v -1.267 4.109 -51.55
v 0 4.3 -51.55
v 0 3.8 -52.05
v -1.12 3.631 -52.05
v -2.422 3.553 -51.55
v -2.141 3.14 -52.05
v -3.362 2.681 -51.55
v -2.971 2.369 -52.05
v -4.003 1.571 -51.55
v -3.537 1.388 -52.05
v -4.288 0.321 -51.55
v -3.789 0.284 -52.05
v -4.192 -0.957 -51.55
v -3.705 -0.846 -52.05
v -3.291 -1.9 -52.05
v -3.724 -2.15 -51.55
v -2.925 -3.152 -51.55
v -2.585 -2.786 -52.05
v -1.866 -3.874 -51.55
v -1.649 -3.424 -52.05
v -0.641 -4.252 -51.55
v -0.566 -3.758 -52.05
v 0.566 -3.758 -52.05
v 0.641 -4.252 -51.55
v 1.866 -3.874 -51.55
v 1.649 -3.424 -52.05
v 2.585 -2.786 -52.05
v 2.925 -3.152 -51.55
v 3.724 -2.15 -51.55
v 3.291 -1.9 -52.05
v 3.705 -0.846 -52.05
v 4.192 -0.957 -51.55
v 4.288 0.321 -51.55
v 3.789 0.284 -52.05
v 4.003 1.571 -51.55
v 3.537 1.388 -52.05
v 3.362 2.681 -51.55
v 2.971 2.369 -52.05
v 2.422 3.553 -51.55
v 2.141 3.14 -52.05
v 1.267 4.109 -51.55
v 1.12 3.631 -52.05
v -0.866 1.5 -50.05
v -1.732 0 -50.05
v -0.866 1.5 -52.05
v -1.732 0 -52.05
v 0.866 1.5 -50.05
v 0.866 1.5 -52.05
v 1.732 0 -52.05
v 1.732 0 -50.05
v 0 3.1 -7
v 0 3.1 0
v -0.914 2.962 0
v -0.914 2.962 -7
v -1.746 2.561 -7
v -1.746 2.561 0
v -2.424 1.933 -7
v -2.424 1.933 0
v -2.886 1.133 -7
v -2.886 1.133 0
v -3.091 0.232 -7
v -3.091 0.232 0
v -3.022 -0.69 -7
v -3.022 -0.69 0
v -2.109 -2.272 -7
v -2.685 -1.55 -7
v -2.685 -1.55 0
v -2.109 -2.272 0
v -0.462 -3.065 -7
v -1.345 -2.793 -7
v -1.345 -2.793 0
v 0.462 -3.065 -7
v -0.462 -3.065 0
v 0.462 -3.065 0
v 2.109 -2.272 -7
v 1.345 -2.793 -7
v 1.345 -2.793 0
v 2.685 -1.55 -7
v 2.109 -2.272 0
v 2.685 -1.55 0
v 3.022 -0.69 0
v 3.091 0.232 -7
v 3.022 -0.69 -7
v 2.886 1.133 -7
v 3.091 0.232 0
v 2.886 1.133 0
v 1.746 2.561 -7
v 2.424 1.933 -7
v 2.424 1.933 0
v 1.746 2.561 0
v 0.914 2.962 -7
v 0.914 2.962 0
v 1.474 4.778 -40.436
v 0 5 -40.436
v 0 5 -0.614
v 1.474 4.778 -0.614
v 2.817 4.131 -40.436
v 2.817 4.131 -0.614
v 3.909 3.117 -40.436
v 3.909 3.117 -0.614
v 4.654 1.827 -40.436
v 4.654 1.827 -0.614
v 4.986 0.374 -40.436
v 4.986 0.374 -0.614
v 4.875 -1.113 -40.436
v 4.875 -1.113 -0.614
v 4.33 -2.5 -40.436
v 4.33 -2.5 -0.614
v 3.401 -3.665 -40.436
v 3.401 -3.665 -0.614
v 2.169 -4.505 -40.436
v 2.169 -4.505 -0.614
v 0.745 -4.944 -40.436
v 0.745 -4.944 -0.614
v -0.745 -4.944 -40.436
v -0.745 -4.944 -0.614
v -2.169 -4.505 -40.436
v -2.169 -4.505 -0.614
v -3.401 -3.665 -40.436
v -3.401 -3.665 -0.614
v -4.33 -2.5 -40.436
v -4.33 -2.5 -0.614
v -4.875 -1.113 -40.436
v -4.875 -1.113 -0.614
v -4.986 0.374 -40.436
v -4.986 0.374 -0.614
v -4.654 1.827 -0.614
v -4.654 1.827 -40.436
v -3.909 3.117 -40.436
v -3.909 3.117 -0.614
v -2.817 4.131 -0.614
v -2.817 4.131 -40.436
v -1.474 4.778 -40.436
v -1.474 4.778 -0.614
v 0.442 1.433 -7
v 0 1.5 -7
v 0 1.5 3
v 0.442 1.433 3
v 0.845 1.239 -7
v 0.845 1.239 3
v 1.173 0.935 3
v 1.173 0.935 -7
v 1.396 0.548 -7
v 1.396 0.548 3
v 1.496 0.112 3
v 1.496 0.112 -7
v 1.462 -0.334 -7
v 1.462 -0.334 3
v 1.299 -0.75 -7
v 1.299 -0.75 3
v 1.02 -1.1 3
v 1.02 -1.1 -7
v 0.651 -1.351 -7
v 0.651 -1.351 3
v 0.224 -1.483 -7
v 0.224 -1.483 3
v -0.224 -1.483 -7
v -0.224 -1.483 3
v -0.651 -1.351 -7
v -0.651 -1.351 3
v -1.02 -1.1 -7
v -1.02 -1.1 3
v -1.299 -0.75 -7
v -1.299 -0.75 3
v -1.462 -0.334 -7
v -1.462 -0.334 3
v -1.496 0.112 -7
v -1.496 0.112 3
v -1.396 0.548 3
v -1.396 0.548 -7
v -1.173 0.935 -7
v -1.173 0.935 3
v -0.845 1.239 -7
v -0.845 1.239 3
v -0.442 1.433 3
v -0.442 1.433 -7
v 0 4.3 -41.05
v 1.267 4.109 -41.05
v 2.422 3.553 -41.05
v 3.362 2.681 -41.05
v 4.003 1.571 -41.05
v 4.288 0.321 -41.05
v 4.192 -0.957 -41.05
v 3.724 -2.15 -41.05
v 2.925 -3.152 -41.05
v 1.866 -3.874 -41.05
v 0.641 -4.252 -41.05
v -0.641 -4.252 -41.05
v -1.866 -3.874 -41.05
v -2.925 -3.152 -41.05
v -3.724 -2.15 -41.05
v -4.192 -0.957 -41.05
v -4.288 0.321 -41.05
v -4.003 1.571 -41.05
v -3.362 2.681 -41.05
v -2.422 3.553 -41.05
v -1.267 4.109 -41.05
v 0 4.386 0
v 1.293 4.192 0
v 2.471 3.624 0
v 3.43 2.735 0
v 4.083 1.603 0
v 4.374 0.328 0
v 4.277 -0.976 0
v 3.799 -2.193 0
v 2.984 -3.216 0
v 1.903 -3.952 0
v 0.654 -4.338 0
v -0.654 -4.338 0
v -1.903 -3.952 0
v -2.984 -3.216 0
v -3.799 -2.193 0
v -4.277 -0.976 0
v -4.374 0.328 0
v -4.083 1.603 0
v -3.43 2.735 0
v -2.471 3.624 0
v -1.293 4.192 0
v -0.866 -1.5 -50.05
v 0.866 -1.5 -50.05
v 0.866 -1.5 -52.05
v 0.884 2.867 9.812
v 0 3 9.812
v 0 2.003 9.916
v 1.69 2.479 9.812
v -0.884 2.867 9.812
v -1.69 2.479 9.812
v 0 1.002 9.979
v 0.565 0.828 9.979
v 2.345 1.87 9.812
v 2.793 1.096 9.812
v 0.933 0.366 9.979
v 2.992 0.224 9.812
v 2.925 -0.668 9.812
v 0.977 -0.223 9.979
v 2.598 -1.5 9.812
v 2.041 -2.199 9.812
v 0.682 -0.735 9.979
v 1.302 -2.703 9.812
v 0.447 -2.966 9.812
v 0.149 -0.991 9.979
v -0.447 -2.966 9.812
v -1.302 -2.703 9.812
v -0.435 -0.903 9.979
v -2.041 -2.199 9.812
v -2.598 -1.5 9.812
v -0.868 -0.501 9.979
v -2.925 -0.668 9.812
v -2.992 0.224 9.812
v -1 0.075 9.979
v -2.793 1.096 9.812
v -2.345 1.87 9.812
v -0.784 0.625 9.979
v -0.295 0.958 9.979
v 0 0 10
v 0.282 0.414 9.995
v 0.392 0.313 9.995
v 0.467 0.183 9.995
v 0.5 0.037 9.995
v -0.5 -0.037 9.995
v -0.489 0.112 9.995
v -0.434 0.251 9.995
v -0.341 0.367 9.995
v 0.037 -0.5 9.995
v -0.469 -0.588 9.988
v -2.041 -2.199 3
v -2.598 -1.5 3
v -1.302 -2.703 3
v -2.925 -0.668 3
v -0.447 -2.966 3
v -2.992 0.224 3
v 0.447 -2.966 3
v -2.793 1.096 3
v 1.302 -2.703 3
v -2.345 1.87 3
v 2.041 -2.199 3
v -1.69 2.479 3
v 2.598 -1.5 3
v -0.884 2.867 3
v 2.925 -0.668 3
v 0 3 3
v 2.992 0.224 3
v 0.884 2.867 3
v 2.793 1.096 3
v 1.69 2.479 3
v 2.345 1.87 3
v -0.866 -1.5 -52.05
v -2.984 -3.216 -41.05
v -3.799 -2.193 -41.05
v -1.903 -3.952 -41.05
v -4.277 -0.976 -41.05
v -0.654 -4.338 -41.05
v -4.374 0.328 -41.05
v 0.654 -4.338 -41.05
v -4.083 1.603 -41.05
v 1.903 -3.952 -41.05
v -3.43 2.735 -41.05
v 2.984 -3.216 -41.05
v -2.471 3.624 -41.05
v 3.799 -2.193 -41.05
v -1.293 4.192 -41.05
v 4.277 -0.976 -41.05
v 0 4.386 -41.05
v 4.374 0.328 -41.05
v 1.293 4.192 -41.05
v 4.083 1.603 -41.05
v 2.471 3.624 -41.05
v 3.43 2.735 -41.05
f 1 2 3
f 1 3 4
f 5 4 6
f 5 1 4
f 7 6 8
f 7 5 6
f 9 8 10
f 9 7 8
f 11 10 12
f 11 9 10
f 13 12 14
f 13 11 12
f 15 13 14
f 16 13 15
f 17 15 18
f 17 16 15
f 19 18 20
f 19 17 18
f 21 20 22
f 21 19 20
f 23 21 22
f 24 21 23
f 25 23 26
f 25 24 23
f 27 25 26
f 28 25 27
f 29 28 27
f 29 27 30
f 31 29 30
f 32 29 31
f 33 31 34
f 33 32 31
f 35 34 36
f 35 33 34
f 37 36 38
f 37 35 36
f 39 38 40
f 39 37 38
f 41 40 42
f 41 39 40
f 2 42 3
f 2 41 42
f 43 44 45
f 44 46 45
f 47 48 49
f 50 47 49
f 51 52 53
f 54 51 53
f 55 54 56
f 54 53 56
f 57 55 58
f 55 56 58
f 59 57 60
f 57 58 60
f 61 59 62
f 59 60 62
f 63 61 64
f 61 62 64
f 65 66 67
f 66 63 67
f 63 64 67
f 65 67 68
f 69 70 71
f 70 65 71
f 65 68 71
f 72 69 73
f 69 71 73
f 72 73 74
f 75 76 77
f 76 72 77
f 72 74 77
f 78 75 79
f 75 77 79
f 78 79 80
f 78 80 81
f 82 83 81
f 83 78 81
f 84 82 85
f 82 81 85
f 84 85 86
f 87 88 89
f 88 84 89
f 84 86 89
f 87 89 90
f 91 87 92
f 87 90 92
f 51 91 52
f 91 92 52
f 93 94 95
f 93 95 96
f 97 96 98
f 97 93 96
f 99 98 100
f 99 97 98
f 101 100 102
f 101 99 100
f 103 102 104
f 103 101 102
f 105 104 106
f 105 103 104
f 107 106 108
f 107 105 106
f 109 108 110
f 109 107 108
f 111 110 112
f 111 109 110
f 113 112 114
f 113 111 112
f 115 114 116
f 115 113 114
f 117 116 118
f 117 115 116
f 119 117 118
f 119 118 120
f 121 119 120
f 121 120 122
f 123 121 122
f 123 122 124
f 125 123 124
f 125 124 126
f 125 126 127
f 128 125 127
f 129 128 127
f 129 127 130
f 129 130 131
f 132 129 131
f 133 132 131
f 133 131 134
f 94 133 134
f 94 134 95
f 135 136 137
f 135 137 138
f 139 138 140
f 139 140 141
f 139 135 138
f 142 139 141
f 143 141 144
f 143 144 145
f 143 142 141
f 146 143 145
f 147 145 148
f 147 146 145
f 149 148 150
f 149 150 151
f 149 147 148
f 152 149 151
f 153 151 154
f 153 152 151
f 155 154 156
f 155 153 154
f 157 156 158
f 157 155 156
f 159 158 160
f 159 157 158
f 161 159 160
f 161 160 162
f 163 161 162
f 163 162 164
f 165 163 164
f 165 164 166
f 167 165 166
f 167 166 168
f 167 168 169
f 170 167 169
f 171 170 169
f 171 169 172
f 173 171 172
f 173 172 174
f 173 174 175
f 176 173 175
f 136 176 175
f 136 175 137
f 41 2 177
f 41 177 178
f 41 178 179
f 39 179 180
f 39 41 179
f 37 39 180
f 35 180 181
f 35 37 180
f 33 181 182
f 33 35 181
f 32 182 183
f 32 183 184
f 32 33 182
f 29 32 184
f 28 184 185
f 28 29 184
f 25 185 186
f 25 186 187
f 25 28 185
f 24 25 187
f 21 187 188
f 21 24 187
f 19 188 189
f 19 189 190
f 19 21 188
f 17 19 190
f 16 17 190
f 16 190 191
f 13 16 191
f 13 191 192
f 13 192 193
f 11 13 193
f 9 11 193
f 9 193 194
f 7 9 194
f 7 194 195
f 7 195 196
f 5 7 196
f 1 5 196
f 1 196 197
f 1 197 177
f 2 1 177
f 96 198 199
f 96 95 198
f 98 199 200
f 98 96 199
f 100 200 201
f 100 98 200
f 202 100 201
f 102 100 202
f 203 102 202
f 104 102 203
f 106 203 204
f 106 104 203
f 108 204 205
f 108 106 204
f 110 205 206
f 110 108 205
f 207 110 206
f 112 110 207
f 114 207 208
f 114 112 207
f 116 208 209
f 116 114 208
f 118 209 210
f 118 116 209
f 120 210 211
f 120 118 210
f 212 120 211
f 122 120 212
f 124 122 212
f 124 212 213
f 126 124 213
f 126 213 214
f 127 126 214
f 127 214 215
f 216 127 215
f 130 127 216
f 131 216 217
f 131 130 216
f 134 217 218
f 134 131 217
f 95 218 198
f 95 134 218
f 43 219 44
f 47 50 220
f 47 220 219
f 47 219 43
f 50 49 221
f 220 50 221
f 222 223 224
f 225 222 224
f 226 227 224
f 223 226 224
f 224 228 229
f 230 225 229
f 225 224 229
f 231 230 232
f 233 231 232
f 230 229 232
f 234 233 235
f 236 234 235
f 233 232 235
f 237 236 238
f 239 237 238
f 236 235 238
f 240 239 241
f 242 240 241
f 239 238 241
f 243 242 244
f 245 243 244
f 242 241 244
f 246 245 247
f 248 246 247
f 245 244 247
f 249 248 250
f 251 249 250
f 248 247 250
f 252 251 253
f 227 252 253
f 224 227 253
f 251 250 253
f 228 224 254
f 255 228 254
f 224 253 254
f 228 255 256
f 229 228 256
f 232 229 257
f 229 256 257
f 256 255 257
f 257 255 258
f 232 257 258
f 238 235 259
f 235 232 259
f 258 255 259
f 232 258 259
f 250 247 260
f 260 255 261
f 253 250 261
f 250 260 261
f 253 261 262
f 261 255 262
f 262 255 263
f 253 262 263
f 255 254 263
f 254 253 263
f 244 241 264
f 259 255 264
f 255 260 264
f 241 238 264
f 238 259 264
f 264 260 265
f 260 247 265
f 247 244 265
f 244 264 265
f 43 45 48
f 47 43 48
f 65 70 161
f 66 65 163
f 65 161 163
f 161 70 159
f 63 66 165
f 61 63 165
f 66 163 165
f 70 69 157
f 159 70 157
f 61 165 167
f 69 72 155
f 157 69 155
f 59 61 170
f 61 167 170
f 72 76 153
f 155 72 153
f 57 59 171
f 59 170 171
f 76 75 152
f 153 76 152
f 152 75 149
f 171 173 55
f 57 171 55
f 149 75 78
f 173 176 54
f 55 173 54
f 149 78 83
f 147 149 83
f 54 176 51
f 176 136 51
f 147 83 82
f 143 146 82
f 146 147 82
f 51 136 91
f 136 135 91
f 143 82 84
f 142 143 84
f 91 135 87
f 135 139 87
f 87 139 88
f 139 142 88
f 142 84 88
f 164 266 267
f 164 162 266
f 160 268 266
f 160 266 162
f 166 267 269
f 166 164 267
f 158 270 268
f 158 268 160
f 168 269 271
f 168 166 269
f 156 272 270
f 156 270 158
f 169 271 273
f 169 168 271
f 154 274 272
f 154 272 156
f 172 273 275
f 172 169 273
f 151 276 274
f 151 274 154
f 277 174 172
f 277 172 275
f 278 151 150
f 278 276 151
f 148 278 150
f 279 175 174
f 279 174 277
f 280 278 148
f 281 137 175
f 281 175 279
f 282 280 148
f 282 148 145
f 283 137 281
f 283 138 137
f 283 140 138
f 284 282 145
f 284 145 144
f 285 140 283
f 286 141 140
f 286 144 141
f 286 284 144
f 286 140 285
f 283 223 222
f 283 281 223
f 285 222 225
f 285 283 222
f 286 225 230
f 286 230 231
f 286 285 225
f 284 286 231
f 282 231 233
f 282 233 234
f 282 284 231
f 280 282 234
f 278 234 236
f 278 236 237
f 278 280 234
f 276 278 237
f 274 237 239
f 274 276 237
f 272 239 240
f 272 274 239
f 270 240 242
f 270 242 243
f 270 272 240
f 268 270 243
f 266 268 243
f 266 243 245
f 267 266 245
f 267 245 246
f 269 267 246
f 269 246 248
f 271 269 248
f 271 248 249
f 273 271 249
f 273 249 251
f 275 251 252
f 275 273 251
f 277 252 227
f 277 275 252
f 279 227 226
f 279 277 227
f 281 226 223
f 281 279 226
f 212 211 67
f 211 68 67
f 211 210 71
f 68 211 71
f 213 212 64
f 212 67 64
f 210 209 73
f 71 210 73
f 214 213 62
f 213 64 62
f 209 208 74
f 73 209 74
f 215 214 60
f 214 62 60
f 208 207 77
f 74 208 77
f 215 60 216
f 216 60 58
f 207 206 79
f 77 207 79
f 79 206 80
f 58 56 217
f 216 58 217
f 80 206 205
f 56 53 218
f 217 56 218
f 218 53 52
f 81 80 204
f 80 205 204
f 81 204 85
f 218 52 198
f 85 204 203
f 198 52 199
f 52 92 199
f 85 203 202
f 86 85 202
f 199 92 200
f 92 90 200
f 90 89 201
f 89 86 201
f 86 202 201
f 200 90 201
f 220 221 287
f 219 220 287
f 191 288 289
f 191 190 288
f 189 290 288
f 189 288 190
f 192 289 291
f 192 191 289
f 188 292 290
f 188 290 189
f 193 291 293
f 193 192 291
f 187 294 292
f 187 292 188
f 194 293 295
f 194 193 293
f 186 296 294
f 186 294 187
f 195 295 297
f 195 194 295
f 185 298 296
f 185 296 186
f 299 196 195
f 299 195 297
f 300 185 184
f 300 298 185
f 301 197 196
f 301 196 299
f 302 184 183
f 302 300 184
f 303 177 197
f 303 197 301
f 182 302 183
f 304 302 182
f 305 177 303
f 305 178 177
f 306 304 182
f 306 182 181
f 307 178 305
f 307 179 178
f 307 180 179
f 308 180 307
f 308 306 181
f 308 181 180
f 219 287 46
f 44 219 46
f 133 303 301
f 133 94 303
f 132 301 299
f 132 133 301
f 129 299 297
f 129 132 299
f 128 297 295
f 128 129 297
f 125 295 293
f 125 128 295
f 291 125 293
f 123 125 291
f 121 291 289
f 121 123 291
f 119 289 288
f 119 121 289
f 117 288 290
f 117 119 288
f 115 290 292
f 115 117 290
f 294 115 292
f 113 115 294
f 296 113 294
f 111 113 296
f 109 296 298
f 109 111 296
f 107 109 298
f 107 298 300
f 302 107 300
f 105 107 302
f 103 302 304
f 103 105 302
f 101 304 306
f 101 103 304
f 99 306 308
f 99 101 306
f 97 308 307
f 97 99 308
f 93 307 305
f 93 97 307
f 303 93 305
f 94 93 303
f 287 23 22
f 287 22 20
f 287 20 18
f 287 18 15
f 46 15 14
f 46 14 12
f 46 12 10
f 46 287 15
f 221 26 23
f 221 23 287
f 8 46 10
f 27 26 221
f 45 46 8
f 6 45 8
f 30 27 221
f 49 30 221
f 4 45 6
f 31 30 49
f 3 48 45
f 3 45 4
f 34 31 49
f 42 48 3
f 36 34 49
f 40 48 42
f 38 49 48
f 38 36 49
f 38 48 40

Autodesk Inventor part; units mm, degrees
sketch "Skizze_1" plane through (0, 0, 0) normal (1, 0, 0) x (0, 1, 0)
  line L0 (0, -52.05) -> (0, 0)
  line L1 (0, -7) -> (3.1, -7)
  line L2 (3.1, -7) -> (3.1, 0)
  line L3 (3.1, 0) -> (4.3865, 0)
  line L4 (4.3865, 0) -> (5, -0.6135)
  line L5 (5, -0.6135) -> (5, -40.4365)
  line L6 (5, -40.4365) -> (4.3865, -41.05)
  line L7 (4.3865, -41.05) -> (4.3, -41.05)
  line L8 (4.3, -41.05) -> (4.3, -51.55)
  line L9 (4.3, -51.55) -> (3.8, -52.05)
  line L10 (3.8, -52.05) -> (0, -52.05)
  line L11 (0, -52.05) -> (0, -7)
revolve "Revolution1" add sketch "Skizze_1" angle 360 about axis through (0, 0, -52.05) along (0, 0, -1)
thread "Thread1" size "M10x1" class "6g" standard "ISO Metric profile" full length
sketch "Skizze_3" plane through (0, 0, 0) normal (1, 0, 0) x (0, 1, 0)
  line L0 (0, -14) -> (0, 10)
  arc A0 (3, 9.8118) -> (0, 10) centre (0, -14) ccw
  line L1 (3, 9.8118) -> (3, 3)
  line L2 (3, 3) -> (1.5, 3)
  line L3 (1.5, 3) -> (1.5, -14)
  line L4 (1.5, -14) -> (0, -14)
  line L5 (0, -14) -> (0, 10)
revolve "Revolution2" add sketch "Skizze_3" angle 360 about axis through (0, 0, -14) along (0, 0, -1)
sketch "Skizze_4" plane through (0, 0, -52.05) normal (0, 0, -1) x (0, 1, 0)
  line L0 (-1.5, -0.866) -> (0, -1.7321)
  line L1 (0, -1.7321) -> (1.5, -0.866)
  line L2 (1.5, -0.866) -> (1.5, 0.866)
  line L3 (1.5, 0.866) -> (0, 1.7321)
  line L4 (0, 1.7321) -> (-1.5, 0.866)
  line L5 (-1.5, 0.866) -> (-1.5, -0.866)
extrude "Extrusion1" cut sketch "Skizze_4" against normal blind 2
ref_plane "FDT_ANBAU_XY" through (0, 0, -1.5) normal (0, 0, -1) x (1, 0, 0)
ref_plane "FDT_ANBAU_YZ" through (0, 0, -1.5) normal (1, 0, 0) x (0, -1, 0)
ref_plane "FDT_ANBAU_ZX" through (0, 0, -1.5) normal (0, -1, 0) x (0, 0, -1)
ref_plane "FDT_NUT_XY" through (0, 0, -21.5) normal (0, 0, 1) x (1, 0, 0)
ref_plane "FDT_NUT_YZ" through (0, 0, -21.5) normal (1, 0, 0) x (0, 1, 0)
ref_plane "FDT_NUT_ZX" through (0, 0, -21.5) normal (0, 1, 0) x (0, 0, 1)
ref_plane "IP_DGSL_XY" through (0, 0, -52.05) normal (0, 0, -1) x (0, 1, 0)
ref_plane "IP_DGSL_YZ" through (0, 0, -52.05) normal (0, 1, 0) x (1, 0, 0)
ref_plane "IP_DGSL_ZX" through (0, 0, -52.05) normal (1, 0, 0) x (0, 0, -1)
ref_plane "NUT1_XY" through (0, 0, -17.025) normal (0, 0, 1) x (1, 0, 0)
ref_plane "NUT1_YZ" through (0, 0, -17.025) normal (1, 0, 0) x (0, 1, 0)
ref_plane "NUT1_ZX" through (0, 0, -17.025) normal (0, 1, 0) x (0, 0, 1)
ref_plane "NUT2_XY" through (0, 0, -24.025) normal (0, 0, 1) x (1, 0, 0)
ref_plane "NUT2_YZ" through (0, 0, -24.025) normal (1, 0, 0) x (0, 1, 0)
ref_plane "NUT2_ZX" through (0, 0, -24.025) normal (0, 1, 0) x (0, 0, 1)
properties part number "548072 DYSW-7-10-Y1F---(SD_0)"
